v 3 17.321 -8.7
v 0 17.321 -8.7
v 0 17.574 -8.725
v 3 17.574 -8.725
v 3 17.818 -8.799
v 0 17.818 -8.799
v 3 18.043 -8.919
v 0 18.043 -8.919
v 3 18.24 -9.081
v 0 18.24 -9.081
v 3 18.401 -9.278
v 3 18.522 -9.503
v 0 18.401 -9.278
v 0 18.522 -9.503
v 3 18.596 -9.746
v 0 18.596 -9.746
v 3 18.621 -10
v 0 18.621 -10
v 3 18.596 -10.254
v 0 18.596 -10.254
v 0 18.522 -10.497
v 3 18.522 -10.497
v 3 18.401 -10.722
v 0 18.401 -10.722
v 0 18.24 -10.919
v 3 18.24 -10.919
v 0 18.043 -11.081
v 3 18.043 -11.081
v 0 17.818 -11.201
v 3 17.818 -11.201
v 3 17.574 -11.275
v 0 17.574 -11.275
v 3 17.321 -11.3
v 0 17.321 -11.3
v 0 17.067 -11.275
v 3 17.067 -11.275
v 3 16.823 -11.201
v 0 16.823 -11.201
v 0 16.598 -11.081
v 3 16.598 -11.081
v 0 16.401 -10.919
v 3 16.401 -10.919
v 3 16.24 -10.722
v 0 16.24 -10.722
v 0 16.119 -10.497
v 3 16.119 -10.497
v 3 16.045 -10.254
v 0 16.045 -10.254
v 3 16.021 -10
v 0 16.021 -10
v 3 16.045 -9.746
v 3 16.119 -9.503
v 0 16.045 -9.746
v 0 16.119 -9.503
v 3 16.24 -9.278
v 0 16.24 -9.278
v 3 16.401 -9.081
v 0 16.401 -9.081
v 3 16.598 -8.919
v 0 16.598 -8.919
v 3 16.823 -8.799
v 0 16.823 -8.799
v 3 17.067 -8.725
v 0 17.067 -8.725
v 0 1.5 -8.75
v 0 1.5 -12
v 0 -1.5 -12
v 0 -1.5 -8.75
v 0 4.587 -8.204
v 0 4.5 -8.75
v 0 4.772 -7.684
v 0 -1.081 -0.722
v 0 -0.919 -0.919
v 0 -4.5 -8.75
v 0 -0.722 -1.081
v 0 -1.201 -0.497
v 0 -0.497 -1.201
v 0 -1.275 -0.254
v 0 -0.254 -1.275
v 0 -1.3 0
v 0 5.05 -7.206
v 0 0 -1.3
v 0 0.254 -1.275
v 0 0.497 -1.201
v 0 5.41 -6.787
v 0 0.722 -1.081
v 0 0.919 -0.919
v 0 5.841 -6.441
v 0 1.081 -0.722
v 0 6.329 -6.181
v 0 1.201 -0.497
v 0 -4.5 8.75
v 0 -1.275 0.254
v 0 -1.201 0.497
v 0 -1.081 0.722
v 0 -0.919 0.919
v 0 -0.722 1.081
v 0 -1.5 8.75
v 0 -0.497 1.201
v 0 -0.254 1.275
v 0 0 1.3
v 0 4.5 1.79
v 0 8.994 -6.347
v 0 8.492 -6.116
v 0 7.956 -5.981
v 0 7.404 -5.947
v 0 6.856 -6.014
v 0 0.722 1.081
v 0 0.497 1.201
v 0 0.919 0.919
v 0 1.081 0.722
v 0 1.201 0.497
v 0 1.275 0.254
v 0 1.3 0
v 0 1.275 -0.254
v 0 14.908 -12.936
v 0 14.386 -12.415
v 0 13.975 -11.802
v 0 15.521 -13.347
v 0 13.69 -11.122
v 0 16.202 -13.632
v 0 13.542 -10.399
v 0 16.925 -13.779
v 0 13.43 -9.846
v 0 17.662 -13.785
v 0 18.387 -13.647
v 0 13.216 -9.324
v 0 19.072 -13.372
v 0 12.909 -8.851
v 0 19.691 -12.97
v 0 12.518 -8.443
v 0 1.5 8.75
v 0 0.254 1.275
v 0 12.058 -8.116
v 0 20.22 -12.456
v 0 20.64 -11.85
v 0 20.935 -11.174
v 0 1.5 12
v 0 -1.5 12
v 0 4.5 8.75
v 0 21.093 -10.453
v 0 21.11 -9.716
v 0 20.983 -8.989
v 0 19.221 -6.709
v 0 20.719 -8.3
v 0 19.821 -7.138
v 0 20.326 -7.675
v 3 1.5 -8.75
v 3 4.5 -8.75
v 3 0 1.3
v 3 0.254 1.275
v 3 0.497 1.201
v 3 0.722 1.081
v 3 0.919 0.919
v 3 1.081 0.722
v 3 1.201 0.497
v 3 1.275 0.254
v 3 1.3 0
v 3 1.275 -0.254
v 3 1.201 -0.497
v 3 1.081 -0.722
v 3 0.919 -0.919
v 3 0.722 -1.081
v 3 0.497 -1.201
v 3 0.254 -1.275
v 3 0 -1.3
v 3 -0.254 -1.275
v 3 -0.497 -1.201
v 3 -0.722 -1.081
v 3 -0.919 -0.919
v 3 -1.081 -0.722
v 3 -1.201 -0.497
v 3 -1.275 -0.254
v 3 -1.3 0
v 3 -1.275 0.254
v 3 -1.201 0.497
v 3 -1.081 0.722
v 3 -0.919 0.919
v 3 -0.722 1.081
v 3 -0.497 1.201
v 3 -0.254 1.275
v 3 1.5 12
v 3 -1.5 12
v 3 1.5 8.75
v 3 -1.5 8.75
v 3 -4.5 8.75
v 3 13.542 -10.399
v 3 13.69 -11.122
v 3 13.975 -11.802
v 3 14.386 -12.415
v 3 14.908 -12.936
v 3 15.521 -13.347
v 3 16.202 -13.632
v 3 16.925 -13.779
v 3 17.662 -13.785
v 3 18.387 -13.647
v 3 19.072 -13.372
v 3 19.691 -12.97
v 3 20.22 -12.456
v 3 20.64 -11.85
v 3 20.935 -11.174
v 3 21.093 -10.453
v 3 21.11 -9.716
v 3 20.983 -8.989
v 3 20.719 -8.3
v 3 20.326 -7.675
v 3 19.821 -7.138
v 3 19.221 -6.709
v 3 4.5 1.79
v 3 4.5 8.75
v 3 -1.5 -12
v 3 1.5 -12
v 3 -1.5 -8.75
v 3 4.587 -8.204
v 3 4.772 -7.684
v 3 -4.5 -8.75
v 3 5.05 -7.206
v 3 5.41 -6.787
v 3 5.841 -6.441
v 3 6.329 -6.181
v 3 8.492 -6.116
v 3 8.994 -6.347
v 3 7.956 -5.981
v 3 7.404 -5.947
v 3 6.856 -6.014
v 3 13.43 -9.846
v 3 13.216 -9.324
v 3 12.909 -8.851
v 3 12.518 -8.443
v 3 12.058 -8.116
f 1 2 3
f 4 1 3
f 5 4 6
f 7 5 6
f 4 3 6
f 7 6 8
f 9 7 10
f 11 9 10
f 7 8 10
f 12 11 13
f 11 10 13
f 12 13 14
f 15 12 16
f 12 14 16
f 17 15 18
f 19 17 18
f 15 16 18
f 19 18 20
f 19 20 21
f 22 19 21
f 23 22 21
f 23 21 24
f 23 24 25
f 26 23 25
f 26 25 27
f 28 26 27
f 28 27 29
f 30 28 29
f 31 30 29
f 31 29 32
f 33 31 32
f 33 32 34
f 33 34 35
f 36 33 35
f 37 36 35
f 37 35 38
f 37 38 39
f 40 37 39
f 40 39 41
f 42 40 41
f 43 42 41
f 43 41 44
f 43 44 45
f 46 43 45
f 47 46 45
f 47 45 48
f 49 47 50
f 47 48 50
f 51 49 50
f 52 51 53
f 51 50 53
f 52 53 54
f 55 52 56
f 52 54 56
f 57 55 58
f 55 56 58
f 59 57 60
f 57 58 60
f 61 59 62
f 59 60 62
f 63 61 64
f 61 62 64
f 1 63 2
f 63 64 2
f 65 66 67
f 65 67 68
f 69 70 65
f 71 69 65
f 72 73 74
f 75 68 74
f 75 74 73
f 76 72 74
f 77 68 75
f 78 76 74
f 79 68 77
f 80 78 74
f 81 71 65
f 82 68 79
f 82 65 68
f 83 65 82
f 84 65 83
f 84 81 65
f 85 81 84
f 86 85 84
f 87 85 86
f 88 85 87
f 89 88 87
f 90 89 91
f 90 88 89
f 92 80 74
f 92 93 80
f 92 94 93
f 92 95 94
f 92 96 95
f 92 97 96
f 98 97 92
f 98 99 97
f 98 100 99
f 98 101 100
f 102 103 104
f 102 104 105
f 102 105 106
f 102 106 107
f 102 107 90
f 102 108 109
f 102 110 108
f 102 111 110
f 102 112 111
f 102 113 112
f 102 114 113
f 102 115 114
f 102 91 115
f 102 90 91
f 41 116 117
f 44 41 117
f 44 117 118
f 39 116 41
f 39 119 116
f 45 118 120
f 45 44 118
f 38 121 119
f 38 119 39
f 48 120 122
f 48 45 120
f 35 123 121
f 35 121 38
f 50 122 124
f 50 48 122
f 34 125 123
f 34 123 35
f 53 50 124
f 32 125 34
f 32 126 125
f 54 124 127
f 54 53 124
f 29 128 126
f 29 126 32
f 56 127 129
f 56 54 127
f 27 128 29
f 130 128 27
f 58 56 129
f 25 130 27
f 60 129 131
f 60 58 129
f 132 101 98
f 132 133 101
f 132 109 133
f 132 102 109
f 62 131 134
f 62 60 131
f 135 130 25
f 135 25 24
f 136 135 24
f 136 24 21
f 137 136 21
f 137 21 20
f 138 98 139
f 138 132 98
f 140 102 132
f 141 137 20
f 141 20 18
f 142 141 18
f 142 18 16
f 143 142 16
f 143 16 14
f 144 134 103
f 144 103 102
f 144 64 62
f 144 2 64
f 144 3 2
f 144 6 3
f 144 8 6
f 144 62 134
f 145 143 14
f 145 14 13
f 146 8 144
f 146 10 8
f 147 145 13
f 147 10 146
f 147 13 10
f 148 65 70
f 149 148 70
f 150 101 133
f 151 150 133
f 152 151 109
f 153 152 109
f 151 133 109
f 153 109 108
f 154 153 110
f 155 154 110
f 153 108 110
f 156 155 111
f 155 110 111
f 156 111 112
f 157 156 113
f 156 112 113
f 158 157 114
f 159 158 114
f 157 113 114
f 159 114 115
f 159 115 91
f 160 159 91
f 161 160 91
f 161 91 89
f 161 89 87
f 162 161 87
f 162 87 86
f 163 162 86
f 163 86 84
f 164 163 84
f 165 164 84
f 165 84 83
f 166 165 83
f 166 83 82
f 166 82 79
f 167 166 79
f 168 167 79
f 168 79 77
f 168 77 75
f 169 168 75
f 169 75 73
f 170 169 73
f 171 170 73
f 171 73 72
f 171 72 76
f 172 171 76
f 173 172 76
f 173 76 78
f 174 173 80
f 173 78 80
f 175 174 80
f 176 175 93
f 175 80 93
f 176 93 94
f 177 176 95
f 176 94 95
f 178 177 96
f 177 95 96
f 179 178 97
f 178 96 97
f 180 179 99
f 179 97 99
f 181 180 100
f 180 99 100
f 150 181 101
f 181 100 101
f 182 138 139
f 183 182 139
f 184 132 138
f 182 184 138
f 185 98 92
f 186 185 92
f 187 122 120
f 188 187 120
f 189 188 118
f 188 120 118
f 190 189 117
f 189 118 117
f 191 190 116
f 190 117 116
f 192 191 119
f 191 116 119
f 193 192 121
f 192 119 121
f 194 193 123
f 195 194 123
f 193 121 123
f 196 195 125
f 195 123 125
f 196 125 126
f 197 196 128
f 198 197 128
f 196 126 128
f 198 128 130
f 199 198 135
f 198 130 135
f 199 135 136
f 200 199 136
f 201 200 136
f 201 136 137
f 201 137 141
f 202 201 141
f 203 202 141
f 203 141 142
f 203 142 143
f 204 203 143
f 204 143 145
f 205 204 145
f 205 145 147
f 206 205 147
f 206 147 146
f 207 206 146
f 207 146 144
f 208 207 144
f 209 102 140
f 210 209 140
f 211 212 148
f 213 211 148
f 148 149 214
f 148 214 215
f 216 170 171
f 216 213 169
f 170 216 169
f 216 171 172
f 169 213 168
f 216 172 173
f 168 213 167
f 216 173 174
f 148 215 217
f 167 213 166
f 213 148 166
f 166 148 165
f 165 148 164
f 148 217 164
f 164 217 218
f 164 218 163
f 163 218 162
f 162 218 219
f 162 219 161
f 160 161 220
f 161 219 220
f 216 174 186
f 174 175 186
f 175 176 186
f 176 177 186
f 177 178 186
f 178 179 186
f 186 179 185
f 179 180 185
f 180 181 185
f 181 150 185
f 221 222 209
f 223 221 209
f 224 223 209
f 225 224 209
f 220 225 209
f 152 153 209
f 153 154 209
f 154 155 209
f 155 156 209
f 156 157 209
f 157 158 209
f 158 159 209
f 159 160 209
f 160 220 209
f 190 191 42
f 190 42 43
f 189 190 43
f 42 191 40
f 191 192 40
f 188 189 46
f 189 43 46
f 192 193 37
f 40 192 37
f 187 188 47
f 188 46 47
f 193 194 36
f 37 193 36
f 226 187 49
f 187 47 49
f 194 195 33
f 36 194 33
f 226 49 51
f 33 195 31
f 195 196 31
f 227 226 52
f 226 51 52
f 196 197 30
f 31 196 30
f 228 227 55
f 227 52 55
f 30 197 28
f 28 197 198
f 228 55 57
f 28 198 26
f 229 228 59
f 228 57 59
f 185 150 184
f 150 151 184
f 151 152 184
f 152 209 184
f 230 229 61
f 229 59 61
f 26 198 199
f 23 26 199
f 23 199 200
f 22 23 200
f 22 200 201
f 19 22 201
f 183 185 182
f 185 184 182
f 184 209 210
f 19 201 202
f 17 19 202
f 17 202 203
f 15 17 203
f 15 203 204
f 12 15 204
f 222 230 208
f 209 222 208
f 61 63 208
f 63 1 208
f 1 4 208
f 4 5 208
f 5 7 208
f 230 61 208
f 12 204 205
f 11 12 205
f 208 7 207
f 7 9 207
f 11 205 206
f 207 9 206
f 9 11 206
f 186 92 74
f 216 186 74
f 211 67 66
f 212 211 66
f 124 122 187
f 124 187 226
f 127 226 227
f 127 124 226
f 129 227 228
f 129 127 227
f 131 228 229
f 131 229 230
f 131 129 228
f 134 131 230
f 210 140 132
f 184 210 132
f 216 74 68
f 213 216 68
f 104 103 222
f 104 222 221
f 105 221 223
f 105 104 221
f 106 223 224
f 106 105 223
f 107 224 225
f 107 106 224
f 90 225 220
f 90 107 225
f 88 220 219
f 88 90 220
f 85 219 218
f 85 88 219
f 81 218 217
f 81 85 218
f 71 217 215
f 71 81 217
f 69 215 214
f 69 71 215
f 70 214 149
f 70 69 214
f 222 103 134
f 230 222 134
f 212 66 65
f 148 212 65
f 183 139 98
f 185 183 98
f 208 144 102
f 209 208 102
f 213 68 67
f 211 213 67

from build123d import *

# Parameters (mm, degrees)
BASE_DEPTH                   = 3
FURO_DE_DI_METRO_2_6_2_6_1_D = 2.6
FILETE1_R                    = 3


with BuildPart() as part:
    # Principal → Base (new body)
    with BuildSketch(Plane(origin=(0, 0, 0), x_dir=(0, 0, -1), z_dir=(1, 0, 0))):
        with BuildLine():
            Line((-12, 1.5), (-12, -1.5))
            Line((-12, -1.5), (-8.75, -1.5))
            Line((-8.75, -1.5), (-8.75, -4.5))
            Line((-8.75, -4.5), (8.75, -4.5))
            Line((8.75, -4.5), (8.75, -1.5))
            Line((8.75, -1.5), (12, -1.5))
            Line((12, -1.5), (12, 1.5))
            Line((12, 1.5), (8.75, 1.5))
            Line((8.75, 1.5), (8.75, 4.5))
            Line((8.75, 4.5), (3.75277675, 4.5))
            Line((3.75277675, 4.5), (9.032995126, 13.645606502))
            ThreePointArc((9.032995126, 13.645606502), (13.507465323, 18.782591182), (6.709103466, 19.220508076))
            Line((6.709103466, 19.220508076), (-1.789785834, 4.5))
            Line((-1.789785834, 4.5), (-8.75, 4.5))
            Line((-8.75, 4.5), (-8.75, 1.5))
            Line((-8.75, 1.5), (-12, 1.5))
        make_face()
    extrude(amount=BASE_DEPTH)

    # Furo de diâmetro Ø2.6 (2.6)1 (through all)
    with Locations(Plane(origin=(3, 0, 0), x_dir=(0, 0, -1), z_dir=(1, 0, 0))):
        with Locations((0, 0), (10, 17.320508076)):
            Hole(FURO_DE_DI_METRO_2_6_2_6_1_D / 2)

    # Filete1
    # the kernel refuses this fillet: 3 mm, written as the material it adds along each edge
    with BuildSketch(Plane(origin=(0, 4.5, -3.75277675), x_dir=(0, 0.8660254037844399, -0.49999999999999784), z_dir=(1, 0, 0))) as filete1_piece_1:
        with BuildLine():
            CenterArc((5.188807443, -3), FILETE1_R, 90, 116.268234178)
            Line((2.498611625, -4.327722283), (2.444807709, -4.354276729))
            ThreePointArc((2.444807709, -4.354276729), (1.197344288, -2.193861142), (-0.051961524, -0.03))
            Line((-0.051961524, -0.03), (0, 0.06))
            Line((0, 0.06), (5.188807443, 0.06))
            Line((5.188807443, 0.06), (5.188807443, 0))
        make_face()
    extrude(amount=3)
    with BuildSketch(Plane(origin=(0, 13.645606502, -9.032995126), x_dir=(0, -0.07594112145280421, -0.9971123036411147), z_dir=(1, 0, 0))) as filete1_piece_2:
        with BuildLine():
            CenterArc((1.91116971, -2.950835533), FILETE1_R, 100.387177891, 53.968120928)
            Line((-0.793315729, -1.652467898), (-0.847405437, -1.626500546))
            Line((-0.847405437, -1.626500546), (-0.054089709, 0.025967353))
            Line((-0.054089709, 0.025967353), (0.010817942, 0.059016711))
            ThreePointArc((0.010817942, 0.059016711), (0.685136311, -0.002274992), (1.35945468, 0.059016711))
            Line((1.35945468, 0.059016711), (1.370272622, 0))
        make_face()
    extrude(amount=3)


solid = part.part
